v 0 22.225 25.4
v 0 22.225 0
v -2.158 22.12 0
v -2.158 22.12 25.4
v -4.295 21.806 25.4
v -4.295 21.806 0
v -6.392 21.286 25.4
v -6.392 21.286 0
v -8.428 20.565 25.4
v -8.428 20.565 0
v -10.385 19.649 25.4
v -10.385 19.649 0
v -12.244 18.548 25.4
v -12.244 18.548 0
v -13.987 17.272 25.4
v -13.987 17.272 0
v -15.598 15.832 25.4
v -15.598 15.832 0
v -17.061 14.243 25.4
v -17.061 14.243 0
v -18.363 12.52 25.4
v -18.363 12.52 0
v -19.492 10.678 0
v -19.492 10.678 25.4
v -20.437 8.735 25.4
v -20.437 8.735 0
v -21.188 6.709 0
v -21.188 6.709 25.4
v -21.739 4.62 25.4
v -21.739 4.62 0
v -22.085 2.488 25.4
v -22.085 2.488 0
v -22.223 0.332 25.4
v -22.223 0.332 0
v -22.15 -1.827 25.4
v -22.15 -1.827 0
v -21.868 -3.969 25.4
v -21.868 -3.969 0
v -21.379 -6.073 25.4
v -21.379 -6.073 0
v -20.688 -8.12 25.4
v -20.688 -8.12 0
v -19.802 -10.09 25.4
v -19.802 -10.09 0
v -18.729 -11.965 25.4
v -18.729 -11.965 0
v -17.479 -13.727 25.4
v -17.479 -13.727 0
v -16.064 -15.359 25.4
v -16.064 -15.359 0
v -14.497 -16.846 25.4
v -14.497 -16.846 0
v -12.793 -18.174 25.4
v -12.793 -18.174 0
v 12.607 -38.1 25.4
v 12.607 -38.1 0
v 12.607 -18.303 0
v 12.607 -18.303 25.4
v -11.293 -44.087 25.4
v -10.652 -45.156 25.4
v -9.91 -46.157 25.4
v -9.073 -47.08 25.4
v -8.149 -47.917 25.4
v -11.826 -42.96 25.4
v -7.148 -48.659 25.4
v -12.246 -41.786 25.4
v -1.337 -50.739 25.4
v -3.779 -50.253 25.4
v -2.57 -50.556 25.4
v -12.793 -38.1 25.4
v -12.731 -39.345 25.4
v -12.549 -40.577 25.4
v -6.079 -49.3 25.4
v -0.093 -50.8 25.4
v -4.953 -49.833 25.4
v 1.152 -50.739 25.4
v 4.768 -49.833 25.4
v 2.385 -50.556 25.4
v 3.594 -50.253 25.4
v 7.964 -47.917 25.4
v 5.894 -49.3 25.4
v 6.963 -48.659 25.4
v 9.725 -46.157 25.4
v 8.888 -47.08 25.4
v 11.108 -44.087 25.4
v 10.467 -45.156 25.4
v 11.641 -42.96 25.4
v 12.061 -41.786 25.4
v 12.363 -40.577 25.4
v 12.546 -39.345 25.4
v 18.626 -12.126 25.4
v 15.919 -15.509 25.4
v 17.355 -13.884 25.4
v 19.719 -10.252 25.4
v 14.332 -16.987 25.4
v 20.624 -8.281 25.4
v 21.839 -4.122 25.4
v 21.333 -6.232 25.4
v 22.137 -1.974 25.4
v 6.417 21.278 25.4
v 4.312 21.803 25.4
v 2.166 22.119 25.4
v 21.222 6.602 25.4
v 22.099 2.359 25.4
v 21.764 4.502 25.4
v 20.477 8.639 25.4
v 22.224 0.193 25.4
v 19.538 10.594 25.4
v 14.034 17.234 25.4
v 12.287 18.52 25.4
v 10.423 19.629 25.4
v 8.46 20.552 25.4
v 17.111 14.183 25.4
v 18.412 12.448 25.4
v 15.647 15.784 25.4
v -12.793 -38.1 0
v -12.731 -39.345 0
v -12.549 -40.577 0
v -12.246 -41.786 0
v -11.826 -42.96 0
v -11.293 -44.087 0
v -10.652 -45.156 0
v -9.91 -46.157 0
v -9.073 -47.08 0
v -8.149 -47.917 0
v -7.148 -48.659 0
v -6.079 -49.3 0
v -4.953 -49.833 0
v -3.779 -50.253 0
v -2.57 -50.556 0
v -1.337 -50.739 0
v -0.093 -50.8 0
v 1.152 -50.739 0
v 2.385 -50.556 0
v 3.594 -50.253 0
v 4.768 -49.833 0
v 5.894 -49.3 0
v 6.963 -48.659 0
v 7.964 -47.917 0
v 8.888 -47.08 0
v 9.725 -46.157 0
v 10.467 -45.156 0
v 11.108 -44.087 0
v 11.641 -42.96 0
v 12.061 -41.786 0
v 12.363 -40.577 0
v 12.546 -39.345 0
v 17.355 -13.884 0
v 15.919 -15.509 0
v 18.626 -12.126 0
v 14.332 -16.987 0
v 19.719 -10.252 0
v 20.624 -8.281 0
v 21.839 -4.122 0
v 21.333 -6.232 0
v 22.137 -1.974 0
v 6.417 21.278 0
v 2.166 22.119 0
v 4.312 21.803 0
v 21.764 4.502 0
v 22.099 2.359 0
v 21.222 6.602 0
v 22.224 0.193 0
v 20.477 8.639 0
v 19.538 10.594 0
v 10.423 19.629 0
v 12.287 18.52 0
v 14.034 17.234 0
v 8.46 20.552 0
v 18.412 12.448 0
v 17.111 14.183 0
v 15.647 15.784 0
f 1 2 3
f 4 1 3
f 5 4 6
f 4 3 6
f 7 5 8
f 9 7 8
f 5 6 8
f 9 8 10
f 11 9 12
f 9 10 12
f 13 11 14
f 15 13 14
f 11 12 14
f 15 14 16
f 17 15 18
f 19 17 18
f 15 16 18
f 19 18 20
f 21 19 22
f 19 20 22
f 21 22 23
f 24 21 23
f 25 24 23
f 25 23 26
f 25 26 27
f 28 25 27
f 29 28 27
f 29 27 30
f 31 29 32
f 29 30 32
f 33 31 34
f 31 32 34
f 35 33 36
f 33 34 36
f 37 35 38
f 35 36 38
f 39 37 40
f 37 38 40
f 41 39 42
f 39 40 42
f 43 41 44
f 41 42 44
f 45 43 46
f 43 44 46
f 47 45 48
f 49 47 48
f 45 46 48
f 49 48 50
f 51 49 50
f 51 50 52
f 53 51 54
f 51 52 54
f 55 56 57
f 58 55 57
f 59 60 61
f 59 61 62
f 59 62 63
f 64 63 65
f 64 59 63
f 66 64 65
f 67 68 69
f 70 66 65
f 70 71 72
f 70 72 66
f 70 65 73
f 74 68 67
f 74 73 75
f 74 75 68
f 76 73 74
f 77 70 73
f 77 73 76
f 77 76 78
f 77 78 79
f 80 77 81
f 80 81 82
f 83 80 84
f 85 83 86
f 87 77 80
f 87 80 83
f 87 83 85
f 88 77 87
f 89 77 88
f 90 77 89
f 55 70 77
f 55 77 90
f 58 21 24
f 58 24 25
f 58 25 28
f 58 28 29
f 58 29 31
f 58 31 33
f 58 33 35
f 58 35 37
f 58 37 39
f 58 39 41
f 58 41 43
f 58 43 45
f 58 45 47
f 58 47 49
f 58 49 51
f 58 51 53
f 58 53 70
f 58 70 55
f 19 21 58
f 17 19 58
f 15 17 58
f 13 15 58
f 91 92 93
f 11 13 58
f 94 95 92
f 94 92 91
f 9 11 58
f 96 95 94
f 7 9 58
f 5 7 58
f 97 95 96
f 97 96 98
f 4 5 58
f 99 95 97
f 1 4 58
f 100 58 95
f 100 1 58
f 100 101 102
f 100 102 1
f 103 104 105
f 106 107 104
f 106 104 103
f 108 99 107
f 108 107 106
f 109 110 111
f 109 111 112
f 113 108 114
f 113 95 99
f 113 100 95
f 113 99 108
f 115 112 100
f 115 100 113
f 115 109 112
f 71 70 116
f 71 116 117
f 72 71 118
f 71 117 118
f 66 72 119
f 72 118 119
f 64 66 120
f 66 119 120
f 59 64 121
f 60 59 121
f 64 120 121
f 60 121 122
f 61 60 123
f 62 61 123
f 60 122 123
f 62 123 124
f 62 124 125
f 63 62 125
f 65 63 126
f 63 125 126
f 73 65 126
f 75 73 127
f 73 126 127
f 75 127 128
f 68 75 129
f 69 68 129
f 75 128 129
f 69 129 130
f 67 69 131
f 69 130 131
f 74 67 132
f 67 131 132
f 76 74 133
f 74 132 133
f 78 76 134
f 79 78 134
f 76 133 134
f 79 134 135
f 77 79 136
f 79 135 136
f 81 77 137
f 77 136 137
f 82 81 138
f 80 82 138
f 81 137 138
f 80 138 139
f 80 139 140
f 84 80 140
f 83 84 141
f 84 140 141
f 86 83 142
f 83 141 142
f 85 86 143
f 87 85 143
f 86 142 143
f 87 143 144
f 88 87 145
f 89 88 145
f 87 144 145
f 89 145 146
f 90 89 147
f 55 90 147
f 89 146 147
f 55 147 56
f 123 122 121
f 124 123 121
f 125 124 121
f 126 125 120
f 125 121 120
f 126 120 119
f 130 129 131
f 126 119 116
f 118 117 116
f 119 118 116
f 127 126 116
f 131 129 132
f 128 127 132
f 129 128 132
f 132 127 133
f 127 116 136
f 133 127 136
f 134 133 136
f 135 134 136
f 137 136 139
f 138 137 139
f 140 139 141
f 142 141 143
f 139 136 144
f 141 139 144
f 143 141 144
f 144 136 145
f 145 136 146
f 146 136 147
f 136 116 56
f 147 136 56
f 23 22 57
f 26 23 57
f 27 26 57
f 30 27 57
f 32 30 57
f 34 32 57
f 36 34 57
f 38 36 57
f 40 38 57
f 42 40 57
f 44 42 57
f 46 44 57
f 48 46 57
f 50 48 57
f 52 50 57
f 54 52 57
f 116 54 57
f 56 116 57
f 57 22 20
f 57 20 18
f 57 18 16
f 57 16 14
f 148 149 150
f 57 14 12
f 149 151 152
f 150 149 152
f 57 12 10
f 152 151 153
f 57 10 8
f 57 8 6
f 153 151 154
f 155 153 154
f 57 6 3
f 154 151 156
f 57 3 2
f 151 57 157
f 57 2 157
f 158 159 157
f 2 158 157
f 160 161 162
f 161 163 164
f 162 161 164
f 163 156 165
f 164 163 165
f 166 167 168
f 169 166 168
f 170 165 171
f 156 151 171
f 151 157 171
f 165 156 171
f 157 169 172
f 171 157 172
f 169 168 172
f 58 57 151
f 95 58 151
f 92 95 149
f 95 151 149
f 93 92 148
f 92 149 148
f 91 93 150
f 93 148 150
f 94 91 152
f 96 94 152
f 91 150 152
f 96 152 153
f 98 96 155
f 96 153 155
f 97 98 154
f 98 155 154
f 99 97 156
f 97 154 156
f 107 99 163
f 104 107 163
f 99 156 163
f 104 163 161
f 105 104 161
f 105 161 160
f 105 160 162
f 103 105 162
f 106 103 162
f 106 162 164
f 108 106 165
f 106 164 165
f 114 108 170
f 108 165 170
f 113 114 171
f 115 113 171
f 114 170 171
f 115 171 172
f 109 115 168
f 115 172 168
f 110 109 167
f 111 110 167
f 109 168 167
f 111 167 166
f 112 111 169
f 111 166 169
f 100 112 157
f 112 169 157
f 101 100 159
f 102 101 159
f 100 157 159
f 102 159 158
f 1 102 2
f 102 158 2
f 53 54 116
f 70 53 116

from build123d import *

# Parameters (mm, degrees)
F1_DEPTH = 25.4


with BuildPart() as f1:
    # F0 (on Top) → F1 (new body)
    with BuildSketch(Plane.XY):
        with BuildLine():
            Line((12.607468, -38.099831), (12.607468, -18.30307))
            ThreePointArc((12.607468, -18.30307), (21.22188, 6.6017), (0, 22.225))
            ThreePointArc((0, 22.225), (-21.188114, 6.709281), (-12.792532, -18.174206))
            Line((-12.792532, -18.174206), (-12.792532, -38.099831))
            ThreePointArc((-12.792532, -38.099831), (-0.092532, -50.799831), (12.607468, -38.099831))
        make_face()
    extrude(amount=F1_DEPTH)


solid = f1.part
